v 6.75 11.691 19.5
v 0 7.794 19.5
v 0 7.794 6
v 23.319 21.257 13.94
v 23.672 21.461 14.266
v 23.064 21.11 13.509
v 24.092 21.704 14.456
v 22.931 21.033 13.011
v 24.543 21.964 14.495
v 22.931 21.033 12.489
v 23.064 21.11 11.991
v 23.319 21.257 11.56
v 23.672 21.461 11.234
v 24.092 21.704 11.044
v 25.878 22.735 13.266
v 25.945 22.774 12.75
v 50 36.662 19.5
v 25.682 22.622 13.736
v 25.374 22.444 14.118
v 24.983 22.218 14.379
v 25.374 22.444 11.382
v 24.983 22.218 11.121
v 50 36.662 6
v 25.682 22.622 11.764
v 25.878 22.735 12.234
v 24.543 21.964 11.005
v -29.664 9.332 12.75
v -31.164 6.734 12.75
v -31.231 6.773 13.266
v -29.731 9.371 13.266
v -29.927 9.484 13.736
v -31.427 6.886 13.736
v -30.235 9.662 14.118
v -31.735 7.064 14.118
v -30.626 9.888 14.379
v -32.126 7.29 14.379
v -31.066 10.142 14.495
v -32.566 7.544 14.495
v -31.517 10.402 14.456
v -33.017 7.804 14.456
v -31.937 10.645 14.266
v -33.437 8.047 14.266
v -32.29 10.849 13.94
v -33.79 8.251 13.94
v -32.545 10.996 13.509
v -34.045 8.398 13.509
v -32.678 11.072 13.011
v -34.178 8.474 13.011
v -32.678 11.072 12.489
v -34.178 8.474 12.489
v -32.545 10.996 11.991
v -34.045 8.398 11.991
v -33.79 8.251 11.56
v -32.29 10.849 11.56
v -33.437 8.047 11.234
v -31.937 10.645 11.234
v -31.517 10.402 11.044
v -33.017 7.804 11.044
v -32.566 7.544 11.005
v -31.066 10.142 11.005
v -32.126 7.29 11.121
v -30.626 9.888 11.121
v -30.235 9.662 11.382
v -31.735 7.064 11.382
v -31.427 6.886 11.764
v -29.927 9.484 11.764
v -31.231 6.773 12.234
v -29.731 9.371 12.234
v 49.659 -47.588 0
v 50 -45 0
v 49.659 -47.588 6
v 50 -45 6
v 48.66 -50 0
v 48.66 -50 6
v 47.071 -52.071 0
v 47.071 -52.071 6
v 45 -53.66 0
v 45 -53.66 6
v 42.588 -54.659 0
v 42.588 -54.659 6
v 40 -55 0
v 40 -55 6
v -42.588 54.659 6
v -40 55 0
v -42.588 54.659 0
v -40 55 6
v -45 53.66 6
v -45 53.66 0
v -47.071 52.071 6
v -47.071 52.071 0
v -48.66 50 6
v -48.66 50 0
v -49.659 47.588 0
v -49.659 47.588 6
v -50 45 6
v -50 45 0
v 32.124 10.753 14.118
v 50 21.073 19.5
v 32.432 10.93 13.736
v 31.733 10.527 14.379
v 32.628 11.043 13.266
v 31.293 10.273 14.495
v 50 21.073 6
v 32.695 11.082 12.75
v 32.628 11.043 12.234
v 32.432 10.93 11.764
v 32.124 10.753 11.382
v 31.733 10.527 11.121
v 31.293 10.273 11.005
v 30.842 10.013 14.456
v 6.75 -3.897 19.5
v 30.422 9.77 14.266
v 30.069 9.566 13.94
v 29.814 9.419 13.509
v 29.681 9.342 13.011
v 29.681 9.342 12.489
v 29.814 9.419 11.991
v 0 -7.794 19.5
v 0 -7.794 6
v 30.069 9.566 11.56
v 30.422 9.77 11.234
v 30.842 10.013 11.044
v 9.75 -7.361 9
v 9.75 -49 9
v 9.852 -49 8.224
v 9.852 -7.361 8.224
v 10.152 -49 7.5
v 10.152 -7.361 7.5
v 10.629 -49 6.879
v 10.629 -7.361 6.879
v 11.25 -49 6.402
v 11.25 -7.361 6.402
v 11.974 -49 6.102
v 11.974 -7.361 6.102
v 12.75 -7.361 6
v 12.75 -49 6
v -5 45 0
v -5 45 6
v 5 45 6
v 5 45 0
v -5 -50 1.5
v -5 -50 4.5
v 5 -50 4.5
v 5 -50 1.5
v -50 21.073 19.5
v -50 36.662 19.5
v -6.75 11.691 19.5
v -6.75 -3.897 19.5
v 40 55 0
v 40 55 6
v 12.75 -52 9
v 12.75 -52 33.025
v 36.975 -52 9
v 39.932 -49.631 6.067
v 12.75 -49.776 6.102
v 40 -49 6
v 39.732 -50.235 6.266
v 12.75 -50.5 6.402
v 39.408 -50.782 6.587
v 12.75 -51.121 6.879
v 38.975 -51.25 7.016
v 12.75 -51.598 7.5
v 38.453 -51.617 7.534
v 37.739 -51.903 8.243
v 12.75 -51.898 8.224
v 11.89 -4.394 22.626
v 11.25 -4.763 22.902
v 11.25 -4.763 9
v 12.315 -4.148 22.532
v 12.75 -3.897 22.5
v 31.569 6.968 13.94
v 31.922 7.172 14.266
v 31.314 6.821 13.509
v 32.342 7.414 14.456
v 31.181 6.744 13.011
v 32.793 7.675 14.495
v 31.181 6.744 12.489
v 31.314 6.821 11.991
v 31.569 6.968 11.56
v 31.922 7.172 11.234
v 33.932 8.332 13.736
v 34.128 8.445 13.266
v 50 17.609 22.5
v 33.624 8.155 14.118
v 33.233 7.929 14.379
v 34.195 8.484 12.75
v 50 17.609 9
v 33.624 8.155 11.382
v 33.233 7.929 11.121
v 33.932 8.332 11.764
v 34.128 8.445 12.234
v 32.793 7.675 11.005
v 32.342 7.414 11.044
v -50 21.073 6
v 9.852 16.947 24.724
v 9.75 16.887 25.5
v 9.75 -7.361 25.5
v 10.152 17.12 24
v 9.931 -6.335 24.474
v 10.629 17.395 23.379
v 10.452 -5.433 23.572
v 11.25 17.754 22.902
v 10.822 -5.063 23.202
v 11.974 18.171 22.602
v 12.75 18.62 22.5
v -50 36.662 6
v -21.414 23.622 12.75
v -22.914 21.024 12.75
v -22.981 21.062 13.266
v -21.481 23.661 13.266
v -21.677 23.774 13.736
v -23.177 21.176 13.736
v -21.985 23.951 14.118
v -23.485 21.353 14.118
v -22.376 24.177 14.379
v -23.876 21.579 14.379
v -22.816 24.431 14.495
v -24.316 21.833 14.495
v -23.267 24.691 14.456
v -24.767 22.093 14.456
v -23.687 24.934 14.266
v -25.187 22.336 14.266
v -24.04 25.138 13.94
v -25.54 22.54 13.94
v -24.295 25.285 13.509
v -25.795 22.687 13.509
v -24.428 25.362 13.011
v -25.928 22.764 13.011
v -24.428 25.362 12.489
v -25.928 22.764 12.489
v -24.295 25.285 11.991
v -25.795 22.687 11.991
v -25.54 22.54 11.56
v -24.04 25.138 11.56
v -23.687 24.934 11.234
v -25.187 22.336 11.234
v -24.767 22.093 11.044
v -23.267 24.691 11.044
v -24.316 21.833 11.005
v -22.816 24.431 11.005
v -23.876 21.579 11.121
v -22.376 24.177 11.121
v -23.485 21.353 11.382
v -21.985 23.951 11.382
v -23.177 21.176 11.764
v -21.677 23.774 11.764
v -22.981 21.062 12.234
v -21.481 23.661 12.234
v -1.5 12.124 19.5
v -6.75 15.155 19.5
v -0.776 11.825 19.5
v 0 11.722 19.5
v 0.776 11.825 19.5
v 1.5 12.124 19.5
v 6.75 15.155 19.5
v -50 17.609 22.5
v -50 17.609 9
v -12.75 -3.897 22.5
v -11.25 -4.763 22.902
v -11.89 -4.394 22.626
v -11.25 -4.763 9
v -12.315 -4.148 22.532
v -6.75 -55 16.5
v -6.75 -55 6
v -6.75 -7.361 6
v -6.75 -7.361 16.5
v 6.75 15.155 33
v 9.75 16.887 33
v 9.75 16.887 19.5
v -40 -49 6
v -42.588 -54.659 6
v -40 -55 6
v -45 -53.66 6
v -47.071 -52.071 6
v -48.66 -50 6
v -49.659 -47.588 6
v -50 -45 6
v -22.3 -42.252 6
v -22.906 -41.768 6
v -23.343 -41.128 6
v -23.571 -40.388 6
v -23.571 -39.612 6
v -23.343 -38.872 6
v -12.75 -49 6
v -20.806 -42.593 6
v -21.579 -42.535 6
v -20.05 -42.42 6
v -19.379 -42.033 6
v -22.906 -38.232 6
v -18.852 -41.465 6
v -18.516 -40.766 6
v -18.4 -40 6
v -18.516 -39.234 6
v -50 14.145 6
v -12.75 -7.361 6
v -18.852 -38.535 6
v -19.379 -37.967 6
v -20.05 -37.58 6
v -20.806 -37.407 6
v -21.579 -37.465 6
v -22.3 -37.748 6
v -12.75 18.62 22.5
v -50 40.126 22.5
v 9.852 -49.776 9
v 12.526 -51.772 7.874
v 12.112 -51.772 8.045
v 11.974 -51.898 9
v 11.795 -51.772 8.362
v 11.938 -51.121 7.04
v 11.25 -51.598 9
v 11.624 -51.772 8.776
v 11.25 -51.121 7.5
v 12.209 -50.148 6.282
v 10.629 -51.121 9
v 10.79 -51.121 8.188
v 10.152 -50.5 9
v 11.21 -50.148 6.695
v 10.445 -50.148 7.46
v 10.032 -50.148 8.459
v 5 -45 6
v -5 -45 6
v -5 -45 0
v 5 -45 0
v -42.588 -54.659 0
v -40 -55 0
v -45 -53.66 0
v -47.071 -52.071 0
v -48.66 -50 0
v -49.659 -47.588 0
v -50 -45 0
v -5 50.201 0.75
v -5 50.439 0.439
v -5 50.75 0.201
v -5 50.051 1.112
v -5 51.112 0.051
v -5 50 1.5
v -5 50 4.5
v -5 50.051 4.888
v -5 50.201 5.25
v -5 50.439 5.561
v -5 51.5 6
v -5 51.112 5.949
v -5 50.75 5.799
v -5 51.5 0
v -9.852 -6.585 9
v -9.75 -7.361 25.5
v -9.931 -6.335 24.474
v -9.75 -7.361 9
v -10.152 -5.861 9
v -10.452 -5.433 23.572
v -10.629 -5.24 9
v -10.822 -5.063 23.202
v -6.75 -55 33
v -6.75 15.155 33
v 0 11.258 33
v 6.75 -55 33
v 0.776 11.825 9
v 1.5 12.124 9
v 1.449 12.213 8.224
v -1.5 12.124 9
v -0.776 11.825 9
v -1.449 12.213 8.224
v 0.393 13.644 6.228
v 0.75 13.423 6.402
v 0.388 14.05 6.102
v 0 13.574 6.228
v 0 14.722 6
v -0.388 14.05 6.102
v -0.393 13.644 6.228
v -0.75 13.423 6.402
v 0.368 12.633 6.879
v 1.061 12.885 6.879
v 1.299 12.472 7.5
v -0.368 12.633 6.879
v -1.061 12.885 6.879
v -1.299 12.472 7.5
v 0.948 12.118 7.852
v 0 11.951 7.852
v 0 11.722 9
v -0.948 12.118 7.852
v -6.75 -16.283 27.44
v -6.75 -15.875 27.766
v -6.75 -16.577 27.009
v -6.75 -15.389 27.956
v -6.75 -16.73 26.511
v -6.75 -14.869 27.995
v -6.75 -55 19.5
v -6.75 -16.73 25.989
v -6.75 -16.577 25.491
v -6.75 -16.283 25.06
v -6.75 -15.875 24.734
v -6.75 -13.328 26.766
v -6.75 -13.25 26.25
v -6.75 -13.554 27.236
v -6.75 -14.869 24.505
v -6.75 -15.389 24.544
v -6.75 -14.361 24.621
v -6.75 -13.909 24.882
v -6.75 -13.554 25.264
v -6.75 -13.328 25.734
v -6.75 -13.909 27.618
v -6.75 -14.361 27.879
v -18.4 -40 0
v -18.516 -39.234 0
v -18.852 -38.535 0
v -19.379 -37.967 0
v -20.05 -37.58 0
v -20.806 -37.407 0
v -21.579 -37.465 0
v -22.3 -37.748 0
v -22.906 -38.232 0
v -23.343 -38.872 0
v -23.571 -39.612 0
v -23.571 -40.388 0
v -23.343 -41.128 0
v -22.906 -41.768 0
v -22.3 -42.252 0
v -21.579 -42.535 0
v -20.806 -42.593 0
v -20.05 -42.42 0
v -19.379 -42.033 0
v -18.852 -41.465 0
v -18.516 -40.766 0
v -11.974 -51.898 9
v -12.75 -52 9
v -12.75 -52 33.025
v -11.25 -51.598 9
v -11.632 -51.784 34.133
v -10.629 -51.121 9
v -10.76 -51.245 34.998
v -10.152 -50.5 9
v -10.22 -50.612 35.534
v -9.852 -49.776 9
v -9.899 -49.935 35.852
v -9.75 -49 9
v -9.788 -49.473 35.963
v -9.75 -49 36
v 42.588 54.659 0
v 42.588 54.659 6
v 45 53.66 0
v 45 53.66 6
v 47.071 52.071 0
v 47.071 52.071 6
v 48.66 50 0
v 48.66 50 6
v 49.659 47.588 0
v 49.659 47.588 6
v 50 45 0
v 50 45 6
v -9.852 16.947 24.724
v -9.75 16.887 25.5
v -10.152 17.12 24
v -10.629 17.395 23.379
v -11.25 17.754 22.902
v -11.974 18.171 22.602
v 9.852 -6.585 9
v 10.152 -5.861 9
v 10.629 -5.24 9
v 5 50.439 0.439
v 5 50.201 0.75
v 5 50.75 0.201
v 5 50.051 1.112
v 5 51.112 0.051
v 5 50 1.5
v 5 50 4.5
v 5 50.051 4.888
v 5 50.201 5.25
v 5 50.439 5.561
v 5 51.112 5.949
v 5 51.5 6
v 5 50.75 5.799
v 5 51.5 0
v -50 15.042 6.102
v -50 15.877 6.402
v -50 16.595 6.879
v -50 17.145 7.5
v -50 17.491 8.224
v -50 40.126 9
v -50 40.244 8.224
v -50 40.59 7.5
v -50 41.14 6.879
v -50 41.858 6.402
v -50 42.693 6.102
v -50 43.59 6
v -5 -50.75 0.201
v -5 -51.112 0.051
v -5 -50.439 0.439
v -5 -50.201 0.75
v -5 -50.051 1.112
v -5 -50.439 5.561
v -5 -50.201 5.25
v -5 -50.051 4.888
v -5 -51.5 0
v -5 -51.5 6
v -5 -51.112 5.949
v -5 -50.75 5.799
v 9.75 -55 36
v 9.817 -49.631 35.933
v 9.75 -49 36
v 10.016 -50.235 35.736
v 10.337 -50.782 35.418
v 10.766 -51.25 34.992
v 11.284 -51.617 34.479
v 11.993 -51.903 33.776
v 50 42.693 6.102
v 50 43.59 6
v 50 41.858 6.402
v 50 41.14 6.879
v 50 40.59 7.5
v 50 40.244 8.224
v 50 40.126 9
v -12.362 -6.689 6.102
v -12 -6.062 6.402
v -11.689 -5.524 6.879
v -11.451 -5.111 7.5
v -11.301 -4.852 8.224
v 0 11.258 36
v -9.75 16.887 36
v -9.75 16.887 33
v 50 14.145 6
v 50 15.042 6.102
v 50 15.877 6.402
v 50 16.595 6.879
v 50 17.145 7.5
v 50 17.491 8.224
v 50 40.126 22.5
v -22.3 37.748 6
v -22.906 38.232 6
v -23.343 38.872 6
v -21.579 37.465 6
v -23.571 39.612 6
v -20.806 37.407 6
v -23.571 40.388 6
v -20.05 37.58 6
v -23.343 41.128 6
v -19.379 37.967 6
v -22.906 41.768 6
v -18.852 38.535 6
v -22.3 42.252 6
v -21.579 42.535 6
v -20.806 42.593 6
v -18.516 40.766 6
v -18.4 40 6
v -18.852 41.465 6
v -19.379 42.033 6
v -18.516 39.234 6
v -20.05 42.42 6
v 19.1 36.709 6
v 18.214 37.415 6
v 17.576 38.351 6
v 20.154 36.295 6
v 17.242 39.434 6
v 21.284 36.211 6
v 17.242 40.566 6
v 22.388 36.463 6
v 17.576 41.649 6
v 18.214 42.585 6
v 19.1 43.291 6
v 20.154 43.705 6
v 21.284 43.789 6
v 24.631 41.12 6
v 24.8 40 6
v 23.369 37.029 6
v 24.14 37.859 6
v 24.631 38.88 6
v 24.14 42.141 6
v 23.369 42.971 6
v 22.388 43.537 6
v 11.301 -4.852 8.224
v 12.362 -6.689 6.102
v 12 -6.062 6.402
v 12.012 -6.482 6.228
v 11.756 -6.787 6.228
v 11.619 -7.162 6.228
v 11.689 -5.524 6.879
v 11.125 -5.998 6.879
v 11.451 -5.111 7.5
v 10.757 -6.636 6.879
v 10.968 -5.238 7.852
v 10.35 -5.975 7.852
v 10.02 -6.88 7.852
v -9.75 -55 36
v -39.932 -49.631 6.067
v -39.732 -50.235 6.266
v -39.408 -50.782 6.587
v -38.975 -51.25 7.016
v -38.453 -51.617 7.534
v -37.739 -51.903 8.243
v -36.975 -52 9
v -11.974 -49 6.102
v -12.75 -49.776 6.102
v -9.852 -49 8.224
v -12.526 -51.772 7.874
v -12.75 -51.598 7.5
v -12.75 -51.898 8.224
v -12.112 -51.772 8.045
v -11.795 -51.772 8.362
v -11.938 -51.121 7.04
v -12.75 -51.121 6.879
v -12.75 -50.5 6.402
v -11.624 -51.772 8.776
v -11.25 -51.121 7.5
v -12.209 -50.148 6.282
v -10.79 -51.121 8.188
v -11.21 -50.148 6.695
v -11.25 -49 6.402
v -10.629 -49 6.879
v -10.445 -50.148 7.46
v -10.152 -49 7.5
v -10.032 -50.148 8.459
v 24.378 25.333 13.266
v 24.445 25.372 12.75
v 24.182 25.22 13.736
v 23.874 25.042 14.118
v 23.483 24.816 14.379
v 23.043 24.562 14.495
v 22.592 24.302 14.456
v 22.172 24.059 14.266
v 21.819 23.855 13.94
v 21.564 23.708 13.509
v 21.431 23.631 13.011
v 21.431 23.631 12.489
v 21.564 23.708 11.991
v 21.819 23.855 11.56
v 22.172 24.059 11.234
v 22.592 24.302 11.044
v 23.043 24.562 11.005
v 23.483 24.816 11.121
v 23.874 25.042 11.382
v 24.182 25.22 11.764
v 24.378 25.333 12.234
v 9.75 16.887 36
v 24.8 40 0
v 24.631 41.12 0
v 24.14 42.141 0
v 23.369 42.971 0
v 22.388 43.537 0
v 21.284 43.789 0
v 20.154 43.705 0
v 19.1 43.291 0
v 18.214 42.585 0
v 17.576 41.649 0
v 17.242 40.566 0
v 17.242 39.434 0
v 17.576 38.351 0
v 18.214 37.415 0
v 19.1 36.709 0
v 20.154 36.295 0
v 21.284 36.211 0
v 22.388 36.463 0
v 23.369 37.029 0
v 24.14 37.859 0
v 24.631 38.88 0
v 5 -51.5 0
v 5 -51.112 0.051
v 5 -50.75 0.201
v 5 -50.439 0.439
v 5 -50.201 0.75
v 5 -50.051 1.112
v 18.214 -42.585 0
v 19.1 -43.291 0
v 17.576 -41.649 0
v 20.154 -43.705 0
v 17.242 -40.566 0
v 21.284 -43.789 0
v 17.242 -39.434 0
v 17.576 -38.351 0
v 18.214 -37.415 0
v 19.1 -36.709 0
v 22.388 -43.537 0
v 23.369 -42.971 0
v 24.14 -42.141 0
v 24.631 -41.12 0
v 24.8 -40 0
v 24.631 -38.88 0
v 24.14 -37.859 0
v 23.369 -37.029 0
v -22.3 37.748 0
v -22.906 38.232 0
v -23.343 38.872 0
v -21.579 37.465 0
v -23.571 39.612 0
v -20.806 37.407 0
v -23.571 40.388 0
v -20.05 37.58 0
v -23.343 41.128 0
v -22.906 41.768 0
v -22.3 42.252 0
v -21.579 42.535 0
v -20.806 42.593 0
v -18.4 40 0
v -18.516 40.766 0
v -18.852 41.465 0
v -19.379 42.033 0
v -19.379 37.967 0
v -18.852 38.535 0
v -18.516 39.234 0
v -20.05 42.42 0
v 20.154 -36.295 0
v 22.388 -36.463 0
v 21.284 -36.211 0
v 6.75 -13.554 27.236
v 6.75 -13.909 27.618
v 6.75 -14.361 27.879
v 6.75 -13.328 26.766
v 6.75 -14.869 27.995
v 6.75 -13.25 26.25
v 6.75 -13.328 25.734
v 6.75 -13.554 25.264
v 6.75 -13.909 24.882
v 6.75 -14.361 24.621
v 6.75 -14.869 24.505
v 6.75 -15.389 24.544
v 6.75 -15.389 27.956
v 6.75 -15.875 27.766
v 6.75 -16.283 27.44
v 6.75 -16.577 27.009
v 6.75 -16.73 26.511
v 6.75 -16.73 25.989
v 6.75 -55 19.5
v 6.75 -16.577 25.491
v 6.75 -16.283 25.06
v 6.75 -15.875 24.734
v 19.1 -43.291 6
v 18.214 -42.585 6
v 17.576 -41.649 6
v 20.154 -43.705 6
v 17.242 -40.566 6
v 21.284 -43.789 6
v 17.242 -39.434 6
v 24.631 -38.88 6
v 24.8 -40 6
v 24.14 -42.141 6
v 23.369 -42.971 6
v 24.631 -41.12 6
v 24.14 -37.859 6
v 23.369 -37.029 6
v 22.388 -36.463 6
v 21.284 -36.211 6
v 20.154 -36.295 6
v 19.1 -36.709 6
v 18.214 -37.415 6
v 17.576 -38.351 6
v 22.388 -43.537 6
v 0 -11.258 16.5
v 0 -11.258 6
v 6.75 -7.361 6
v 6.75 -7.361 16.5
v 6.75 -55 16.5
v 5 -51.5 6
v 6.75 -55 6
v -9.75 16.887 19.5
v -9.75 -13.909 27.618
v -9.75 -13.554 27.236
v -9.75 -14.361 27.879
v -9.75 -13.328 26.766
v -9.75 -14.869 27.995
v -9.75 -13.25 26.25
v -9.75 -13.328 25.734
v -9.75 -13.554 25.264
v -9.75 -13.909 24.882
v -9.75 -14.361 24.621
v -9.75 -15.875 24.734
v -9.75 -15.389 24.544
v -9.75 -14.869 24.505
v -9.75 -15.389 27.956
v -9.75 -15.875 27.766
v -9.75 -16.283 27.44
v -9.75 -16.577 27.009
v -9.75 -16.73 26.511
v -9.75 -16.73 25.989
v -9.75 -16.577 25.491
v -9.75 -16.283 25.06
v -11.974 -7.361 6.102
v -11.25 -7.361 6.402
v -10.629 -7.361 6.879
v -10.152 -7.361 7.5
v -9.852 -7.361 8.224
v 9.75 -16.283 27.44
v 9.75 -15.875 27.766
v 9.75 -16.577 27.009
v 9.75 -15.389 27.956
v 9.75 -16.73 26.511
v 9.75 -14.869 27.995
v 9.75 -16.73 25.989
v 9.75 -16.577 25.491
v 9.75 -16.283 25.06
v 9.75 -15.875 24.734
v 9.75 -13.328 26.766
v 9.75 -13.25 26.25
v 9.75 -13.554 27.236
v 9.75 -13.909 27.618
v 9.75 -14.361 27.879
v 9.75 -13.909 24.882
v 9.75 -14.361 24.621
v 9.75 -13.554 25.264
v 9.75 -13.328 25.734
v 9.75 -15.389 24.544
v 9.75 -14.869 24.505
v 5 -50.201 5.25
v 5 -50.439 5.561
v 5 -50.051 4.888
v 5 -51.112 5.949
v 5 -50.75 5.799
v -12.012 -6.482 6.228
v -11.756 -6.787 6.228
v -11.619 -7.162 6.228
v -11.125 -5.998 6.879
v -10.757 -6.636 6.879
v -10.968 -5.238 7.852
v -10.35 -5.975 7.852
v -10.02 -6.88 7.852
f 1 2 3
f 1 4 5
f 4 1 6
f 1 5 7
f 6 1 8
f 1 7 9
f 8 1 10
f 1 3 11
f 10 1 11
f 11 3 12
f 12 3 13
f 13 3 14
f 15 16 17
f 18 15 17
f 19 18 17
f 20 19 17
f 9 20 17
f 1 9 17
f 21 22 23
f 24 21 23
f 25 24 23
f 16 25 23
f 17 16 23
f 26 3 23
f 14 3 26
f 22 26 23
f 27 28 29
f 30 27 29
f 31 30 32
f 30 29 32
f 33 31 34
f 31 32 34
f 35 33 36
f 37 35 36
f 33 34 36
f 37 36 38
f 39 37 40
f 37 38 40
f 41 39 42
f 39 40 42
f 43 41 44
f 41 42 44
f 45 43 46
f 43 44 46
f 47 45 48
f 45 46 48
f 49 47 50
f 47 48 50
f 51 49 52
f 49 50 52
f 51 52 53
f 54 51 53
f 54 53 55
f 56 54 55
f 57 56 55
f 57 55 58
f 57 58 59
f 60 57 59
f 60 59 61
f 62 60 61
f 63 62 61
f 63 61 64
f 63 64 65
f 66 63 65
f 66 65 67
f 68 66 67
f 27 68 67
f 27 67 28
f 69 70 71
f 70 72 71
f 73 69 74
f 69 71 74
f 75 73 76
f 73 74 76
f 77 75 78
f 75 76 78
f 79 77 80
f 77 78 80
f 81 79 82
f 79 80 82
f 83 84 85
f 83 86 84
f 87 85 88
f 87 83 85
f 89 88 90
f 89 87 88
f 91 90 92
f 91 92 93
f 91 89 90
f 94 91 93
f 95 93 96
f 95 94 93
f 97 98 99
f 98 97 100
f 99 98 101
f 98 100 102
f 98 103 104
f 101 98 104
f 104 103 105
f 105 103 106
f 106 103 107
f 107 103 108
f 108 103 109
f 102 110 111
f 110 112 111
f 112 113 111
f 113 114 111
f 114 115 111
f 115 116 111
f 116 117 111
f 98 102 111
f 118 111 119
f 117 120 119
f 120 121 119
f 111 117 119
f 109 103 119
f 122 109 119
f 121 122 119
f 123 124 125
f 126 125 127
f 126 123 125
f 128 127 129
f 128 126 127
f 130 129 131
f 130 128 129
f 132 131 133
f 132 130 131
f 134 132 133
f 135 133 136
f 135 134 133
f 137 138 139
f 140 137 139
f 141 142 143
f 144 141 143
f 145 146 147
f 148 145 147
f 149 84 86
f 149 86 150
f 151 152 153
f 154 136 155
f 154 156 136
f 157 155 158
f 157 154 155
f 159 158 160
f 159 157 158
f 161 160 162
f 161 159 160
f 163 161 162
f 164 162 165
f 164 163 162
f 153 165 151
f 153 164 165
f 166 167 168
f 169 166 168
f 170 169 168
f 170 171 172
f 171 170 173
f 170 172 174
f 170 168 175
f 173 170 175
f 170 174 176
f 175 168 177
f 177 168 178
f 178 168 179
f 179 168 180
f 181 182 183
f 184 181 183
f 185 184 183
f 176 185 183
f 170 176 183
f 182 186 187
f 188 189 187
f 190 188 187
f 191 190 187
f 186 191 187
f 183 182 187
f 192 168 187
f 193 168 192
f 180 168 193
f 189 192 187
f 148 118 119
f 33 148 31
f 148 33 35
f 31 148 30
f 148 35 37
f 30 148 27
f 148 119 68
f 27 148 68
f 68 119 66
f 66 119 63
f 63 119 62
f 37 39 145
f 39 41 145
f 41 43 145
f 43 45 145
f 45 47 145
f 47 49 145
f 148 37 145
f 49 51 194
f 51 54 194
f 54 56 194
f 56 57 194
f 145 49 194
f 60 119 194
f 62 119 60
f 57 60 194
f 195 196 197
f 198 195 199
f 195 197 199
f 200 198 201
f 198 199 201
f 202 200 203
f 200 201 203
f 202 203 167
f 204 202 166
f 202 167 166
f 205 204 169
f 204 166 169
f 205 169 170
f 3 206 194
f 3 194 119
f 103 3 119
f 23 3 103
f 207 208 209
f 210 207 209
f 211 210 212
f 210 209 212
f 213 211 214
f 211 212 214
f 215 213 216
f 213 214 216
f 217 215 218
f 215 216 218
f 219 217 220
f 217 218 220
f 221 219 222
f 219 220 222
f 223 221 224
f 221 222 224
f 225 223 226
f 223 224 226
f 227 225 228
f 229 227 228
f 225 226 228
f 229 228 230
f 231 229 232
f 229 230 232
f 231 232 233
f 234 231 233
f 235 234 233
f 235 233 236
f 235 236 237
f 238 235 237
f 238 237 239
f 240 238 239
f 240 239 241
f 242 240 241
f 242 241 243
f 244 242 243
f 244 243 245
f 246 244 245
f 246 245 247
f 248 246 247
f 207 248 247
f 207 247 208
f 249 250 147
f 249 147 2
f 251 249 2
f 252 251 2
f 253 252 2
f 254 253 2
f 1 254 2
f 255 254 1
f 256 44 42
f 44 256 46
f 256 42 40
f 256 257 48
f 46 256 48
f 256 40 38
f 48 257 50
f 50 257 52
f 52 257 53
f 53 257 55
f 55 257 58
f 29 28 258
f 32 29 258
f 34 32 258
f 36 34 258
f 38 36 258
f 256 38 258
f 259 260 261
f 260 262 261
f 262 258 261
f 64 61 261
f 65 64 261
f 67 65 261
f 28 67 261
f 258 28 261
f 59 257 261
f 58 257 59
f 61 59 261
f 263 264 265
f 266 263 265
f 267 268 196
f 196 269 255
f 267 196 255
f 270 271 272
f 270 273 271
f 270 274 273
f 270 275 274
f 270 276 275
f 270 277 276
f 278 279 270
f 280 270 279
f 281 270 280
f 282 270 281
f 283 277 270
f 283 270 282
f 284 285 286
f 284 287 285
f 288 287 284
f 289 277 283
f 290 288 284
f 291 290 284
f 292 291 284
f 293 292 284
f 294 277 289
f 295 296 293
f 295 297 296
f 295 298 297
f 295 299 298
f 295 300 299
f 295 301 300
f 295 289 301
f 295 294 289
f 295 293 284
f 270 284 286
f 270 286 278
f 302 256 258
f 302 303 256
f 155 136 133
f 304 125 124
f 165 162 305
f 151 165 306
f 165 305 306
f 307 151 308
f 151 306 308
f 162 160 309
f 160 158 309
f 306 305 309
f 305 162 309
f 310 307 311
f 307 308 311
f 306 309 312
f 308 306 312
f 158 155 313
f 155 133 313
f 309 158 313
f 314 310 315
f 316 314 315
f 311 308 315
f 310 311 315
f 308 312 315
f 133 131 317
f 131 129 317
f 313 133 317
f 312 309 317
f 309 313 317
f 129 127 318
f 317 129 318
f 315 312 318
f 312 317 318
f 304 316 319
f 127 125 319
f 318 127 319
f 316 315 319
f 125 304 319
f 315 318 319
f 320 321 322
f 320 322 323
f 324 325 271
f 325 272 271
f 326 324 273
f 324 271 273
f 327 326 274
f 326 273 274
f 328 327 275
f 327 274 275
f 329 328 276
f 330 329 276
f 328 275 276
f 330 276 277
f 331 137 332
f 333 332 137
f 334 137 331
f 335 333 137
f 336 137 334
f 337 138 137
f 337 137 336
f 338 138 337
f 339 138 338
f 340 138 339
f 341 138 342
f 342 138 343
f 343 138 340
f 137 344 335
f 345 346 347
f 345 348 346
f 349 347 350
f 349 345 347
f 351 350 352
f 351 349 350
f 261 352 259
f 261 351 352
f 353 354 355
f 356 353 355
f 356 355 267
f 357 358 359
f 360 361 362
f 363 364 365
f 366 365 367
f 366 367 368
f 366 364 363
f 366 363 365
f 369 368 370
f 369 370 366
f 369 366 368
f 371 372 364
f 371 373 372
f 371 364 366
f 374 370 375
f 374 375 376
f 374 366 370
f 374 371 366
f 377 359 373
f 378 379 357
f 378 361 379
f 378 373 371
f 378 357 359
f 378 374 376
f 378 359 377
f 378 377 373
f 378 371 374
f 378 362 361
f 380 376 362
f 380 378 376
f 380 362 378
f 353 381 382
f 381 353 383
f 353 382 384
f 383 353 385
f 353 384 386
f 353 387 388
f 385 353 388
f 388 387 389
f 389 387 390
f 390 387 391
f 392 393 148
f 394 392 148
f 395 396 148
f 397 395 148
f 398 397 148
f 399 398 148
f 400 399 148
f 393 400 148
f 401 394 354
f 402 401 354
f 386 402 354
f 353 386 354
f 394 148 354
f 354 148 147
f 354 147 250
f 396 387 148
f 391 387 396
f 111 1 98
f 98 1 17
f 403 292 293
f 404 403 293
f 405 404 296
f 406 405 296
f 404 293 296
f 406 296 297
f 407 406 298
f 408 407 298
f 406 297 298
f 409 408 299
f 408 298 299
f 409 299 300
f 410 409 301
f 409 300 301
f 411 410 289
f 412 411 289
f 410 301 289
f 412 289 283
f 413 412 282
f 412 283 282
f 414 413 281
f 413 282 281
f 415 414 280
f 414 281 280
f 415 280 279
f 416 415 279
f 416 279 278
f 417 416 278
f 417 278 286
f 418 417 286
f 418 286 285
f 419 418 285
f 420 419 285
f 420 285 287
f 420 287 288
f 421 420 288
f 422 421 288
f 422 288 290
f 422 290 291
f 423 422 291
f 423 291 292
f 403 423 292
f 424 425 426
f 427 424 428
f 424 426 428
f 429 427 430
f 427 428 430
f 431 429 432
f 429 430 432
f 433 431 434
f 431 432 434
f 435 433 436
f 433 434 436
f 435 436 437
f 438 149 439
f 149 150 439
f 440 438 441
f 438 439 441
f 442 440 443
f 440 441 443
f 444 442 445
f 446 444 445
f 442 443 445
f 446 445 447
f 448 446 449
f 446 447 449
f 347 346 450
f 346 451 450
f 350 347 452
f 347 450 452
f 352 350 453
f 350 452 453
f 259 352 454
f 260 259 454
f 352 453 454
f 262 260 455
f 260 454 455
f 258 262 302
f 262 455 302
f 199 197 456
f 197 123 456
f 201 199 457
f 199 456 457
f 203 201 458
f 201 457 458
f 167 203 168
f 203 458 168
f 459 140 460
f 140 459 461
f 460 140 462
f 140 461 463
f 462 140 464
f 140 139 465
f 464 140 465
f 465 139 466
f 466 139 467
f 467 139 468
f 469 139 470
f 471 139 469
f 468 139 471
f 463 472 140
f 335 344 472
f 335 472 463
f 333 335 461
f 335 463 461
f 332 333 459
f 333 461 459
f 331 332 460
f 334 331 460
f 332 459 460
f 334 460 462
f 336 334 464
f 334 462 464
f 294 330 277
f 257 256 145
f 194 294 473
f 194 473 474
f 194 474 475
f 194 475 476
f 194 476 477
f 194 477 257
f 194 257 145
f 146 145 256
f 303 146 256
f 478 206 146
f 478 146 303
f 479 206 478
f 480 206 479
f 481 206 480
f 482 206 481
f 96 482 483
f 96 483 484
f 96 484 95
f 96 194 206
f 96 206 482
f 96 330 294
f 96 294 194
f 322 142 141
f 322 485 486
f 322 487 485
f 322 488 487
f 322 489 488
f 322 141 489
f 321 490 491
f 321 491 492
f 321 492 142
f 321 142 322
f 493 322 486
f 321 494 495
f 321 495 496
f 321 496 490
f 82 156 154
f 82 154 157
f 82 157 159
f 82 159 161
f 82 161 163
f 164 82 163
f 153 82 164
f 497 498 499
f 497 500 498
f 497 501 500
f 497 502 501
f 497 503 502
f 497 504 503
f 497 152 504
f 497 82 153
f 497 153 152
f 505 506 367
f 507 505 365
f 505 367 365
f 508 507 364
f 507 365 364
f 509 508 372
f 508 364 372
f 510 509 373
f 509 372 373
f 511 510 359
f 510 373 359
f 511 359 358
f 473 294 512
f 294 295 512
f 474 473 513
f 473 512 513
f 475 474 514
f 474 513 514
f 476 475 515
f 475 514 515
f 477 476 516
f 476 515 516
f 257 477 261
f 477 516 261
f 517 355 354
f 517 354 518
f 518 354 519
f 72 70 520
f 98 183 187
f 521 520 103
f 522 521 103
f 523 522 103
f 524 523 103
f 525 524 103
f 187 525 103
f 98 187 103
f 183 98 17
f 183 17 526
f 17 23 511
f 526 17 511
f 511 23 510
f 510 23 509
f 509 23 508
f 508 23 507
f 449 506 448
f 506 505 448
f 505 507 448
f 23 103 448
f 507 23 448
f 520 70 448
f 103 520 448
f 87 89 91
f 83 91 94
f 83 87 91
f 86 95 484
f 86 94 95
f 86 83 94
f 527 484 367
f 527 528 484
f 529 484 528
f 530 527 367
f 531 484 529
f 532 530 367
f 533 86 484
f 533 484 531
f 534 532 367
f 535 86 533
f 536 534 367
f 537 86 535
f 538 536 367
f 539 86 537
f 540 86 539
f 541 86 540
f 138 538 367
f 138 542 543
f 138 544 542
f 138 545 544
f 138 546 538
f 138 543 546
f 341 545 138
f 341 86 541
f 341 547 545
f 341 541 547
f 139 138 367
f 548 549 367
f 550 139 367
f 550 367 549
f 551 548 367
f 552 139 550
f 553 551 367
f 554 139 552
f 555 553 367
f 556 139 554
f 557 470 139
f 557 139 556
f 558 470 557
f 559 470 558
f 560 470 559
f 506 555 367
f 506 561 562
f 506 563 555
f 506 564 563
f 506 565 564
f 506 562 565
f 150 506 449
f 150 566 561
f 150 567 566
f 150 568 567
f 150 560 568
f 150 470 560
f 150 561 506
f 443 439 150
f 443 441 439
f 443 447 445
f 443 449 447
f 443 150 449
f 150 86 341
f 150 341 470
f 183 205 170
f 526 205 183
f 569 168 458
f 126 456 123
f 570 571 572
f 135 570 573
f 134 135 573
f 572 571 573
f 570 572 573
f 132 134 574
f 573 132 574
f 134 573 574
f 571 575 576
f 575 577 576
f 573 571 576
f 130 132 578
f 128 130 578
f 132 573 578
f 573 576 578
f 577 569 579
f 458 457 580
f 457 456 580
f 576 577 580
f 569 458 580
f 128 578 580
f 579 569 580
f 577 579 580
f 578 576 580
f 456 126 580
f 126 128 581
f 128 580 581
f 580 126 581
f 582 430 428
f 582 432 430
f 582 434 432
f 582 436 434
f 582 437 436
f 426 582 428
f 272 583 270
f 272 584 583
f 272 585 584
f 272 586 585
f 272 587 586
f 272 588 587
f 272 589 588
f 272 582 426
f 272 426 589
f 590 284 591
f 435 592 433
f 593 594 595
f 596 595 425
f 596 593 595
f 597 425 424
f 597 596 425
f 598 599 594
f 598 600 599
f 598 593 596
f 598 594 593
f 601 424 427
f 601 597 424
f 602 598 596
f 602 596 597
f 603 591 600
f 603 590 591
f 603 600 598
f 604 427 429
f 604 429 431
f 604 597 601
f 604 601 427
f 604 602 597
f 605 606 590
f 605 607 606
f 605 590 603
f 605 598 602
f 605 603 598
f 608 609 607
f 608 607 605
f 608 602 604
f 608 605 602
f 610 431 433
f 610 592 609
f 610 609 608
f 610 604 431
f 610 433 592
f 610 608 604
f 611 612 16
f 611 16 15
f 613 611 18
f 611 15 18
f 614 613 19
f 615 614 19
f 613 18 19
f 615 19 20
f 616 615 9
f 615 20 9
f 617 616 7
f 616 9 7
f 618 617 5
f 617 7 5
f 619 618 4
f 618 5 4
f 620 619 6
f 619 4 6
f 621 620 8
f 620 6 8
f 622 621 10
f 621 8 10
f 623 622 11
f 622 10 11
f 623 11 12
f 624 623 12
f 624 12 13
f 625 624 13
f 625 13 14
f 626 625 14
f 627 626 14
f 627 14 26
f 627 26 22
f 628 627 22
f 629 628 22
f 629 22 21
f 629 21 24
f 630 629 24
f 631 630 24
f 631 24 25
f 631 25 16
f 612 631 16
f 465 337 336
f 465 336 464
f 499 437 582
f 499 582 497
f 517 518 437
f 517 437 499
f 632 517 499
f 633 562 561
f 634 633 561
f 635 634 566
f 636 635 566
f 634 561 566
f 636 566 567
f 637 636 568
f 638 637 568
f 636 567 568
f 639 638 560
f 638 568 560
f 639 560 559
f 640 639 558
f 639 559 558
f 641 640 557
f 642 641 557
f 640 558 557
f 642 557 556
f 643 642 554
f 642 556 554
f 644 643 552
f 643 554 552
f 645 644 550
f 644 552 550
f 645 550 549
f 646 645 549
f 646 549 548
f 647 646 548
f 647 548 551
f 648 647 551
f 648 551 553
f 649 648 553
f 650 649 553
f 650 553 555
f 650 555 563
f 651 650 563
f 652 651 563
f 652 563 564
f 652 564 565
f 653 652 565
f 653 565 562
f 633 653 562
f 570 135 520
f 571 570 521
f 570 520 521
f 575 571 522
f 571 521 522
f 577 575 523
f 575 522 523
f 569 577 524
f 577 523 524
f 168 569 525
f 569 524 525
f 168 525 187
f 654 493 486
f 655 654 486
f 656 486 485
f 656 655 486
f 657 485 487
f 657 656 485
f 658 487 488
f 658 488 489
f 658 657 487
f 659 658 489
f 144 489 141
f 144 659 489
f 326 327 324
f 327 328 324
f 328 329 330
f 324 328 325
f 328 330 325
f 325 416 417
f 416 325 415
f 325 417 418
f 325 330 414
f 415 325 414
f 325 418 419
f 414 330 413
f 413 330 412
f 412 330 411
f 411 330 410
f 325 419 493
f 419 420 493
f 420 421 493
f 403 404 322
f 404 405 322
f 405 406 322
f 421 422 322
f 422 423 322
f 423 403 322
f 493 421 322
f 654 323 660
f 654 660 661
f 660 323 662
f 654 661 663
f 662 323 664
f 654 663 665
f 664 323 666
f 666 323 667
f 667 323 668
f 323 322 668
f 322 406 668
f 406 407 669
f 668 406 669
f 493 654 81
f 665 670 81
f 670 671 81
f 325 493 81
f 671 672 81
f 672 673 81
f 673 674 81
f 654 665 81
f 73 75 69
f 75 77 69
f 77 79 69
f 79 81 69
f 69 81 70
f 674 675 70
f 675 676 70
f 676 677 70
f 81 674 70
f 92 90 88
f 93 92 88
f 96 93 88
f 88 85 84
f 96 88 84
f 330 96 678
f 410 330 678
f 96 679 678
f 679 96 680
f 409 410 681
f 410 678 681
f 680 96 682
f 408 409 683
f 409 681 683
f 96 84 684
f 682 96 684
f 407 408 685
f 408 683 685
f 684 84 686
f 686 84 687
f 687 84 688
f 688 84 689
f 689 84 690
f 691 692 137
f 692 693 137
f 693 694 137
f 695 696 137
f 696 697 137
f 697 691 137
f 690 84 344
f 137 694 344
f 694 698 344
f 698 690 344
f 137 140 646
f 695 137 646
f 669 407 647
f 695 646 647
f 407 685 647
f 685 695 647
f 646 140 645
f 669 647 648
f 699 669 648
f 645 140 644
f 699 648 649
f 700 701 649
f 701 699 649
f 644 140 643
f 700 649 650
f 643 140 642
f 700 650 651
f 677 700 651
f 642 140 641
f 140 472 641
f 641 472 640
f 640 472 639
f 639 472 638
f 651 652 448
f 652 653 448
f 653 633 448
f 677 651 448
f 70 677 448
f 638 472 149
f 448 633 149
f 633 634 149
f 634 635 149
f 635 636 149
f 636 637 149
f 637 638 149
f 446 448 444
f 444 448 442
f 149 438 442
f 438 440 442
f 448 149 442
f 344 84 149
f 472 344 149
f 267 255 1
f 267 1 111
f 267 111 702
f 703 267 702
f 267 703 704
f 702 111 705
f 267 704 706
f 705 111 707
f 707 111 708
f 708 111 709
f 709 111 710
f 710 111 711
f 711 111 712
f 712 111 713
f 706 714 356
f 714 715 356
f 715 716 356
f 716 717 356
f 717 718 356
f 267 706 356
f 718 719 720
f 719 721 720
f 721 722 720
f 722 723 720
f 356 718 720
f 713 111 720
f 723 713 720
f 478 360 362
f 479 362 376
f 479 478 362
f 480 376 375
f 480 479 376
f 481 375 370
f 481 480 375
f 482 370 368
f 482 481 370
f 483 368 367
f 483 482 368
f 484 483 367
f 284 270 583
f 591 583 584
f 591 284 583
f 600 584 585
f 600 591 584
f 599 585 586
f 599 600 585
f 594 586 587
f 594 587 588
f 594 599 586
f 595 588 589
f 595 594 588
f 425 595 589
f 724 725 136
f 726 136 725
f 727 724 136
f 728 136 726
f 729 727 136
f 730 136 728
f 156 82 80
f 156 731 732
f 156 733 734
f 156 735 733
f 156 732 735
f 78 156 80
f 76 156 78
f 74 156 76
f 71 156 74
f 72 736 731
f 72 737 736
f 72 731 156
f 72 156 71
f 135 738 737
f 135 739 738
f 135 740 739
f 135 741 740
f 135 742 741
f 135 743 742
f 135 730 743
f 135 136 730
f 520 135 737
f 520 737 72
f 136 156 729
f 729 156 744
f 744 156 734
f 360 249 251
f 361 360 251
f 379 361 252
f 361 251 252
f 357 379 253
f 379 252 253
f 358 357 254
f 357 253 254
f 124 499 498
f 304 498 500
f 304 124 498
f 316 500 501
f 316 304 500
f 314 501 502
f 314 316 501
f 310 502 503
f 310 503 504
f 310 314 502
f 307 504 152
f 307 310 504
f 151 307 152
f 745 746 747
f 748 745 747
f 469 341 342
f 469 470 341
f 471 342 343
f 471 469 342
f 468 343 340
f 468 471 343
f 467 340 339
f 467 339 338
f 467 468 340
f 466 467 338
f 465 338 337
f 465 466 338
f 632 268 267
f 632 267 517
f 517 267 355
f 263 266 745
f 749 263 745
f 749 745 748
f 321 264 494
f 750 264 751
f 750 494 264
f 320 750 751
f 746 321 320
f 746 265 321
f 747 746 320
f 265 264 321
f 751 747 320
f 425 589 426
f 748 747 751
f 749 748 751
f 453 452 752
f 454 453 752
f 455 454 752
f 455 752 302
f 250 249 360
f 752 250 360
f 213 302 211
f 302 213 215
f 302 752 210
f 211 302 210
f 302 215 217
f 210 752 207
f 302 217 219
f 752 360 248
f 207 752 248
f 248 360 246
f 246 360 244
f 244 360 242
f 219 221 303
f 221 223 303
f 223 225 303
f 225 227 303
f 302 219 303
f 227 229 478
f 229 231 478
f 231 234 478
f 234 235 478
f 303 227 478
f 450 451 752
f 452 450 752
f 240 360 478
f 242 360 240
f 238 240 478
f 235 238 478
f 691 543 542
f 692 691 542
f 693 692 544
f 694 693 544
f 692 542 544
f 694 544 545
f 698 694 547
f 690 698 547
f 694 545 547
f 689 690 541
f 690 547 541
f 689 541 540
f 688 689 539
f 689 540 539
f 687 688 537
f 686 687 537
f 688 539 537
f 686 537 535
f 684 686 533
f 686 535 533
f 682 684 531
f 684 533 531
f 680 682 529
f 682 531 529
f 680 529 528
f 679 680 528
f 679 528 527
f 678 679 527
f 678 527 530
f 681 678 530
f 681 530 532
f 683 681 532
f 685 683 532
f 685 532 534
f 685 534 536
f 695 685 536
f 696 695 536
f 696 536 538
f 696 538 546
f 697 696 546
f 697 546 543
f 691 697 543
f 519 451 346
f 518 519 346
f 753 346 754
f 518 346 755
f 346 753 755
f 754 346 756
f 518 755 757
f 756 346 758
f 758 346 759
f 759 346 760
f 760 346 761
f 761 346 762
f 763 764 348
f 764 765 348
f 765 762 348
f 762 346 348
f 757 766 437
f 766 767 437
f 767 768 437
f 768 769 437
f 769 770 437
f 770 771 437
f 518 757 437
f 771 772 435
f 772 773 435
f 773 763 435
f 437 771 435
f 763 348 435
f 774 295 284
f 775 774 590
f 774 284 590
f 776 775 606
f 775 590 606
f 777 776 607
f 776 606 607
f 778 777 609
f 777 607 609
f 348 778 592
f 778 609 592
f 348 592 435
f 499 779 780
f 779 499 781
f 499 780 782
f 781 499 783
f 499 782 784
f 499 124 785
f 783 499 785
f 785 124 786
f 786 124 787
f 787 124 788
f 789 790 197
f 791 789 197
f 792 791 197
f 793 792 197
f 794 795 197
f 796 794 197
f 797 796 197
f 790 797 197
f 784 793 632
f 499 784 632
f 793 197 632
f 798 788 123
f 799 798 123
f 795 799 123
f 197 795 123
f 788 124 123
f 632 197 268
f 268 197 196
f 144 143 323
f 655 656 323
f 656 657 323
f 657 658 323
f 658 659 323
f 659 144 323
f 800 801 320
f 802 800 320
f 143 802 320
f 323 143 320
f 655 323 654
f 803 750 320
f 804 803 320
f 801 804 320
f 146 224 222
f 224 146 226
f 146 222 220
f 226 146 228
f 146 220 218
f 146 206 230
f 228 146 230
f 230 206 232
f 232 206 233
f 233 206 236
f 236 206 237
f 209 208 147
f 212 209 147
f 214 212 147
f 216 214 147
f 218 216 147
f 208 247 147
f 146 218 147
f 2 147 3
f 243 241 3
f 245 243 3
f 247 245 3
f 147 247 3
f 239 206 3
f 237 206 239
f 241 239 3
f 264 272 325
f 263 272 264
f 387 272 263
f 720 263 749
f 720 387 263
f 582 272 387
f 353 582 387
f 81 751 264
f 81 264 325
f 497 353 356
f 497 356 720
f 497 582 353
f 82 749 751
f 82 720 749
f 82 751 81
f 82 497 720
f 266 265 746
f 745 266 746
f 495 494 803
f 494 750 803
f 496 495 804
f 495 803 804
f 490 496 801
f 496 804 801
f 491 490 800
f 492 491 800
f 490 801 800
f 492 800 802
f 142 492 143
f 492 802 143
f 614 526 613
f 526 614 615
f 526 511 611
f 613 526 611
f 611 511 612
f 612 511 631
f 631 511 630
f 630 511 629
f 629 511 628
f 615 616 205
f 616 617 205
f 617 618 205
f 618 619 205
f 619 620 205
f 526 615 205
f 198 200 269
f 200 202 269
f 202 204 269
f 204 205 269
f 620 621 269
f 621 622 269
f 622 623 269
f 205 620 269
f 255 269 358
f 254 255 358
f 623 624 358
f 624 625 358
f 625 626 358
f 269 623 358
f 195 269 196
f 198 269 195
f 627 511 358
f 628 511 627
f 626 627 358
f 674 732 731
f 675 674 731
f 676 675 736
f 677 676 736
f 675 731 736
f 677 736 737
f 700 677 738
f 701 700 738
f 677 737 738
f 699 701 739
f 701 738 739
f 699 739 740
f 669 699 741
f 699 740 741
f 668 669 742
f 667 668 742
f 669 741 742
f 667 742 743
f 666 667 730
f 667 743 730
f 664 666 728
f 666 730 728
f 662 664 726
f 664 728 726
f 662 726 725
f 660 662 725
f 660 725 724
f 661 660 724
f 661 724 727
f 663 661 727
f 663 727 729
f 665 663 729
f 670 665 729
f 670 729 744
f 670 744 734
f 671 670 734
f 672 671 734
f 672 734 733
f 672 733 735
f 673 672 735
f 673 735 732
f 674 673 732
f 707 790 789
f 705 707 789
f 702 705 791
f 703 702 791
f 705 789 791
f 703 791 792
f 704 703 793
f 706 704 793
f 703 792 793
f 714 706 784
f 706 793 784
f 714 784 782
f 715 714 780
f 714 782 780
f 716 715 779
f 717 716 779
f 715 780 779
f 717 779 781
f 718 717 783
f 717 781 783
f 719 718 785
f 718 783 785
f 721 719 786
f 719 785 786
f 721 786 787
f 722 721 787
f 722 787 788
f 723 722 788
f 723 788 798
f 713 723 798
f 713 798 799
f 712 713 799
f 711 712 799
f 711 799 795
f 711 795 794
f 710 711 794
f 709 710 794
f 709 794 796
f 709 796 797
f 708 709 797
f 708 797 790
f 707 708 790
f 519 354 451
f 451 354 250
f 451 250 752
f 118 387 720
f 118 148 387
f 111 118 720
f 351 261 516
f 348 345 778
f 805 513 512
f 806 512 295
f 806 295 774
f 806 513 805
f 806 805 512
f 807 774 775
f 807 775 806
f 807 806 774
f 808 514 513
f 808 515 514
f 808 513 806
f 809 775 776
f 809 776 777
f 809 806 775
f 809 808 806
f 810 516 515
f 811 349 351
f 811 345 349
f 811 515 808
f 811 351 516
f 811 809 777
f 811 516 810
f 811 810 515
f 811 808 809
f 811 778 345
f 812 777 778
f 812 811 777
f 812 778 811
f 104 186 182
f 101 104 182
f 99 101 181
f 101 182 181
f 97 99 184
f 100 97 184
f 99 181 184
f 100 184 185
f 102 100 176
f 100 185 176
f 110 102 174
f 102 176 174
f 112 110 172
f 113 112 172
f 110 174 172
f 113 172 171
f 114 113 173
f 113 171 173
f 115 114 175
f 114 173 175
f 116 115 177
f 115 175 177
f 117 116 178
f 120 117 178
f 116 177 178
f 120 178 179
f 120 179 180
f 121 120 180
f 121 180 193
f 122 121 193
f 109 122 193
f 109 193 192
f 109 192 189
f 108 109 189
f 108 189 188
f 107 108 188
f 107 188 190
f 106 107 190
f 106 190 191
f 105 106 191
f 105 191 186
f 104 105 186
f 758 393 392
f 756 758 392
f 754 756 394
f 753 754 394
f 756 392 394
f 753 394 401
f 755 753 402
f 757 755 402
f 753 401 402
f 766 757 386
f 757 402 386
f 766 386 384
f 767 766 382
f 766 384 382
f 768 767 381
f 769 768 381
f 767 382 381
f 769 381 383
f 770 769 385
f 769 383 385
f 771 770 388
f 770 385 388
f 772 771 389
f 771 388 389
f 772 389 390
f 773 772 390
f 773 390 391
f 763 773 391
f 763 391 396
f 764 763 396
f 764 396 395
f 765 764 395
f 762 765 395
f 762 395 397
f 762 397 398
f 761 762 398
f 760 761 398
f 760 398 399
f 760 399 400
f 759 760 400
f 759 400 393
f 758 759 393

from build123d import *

# Parameters (mm, degrees)
F0_W      = 100
F0_H      = 110
F1_DEPTH  = 6
F2_W      = 10
F2_H      = 5
F3_DEPTH  = 6.001
F5_R      = 3.8
F5_R_2    = 2.6
F6_DEPTH  = 6.001
F7_DEPTH  = 13.5
F10_DEPTH = 13.5
F12_DEPTH = 3
F14_DEPTH = 3
F16_DEPTH = 3
F17_R     = 1.75
F18_DEPTH = 82.3823972081
F19_R     = 1.75
F20_DEPTH = 82.3823972081
F21_R     = 1.5
F22_R     = 10
F24_DEPTH = 3
F25_R     = 3
F26_R     = 1.75
F27_DEPTH = 59.751


with BuildPart() as f1:
    # F0 (on Top) → F1 (new body)
    with BuildSketch(Plane.XY):
        Rectangle(F0_W, F0_H)
    extrude(amount=F1_DEPTH)

    # F2 (on face) → F3 (cut, through all)
    with BuildSketch(Plane.XY.offset(6)):
        with Locations((0, 47.5)):
            Rectangle(F2_W, F2_H)
        with Locations((0, -47.5)):
            Rectangle(F2_W, F2_H)
    extrude(amount=-F3_DEPTH, mode=Mode.SUBTRACT)

    # F5 (on face) → F6 (cut, through all)
    with BuildSketch(Plane.XY.offset(6)):
        with Locations((21, -40)):
            Circle(F5_R)
        with Locations((21, 40)):
            Circle(F5_R)
        with Locations((-21, 40)):
            Circle(F5_R_2)
        with Locations((-21, -40)):
            Circle(F5_R_2)
    extrude(amount=-F6_DEPTH, mode=Mode.SUBTRACT)

    # F4 (on face) → F7 (join)
    with BuildSketch(Plane.XY.offset(6)):
        Polygon((50, 21.0732848254), (0, -7.7942286341), (-50, 21.0732848254), (-50, 17.6091832103), (-9.75, -5.6291651246), (-9.75, -55), (-6.75, -55), (-6.75, -7.3612159322), (0, -11.2583302492), (6.75, -7.3612159322), (6.75, -55), (9.75, -55), (9.75, -5.6291651246), (50, 17.6091832103), align=None)
        Polygon((-50, 36.6617420935), (0, 7.7942286341), (50, 36.6617420935), (50, 40.1258437087), (0, 11.2583302492), (-50, 40.1258437087), align=None)
    extrude(amount=F7_DEPTH)

    # F9 (on face) → F10 (join)
    with BuildSketch(Plane.XY.offset(19.5)):
        Polygon((-9.75, 16.8874953738), (-9.75, -55), (-6.75, -55), (-6.75, 15.1554445662), align=None)
        Polygon((9.75, 16.8874953738), (6.75, 15.1554445662), (6.75, -55), (9.75, -55), align=None)
    extrude(amount=F10_DEPTH)

    # F11 (on face) → F12 (join)
    with BuildSketch(Plane.XY.offset(19.5)):
        Polygon((9.75, 16.8874953738), (9.75, -5.6291651246), (50, 17.6091832103), (50, 40.1258437087), align=None)
        Polygon((-50, 40.1258437087), (-50, 17.6091832103), (-9.75, -5.6291651246), (-9.75, 16.8874953738), align=None)
    extrude(amount=F12_DEPTH)

    # F13 (on offset) → F14 (join)
    with BuildSketch(Plane.XY.offset(19.5)):
        Polygon((-6.75, -7.3612159322), (-6.75, -55), (6.75, -55), (6.75, -7.3612159322), (0, -11.2583302492), align=None)
    extrude(amount=-F14_DEPTH)

    # F15 (on face) → F16 (join)
    with BuildSketch(Plane.XY.offset(33)):
        Polygon((0, 11.2583302492), (-9.75, 16.8874953738), (-9.75, -55), (9.75, -55), (9.75, 16.8874953738), align=None)
    extrude(amount=F16_DEPTH)

    # F17 (on face) → F18 (cut, through all)
    with BuildSketch(Plane(origin=(4.875, -8.4437476869, 0), x_dir=(0.8660254038, 0.5, 0), z_dir=(0.5, -0.8660254038, 0))):
        with Locations((32.1058617944, 12.75)):
            Circle(F17_R)
    extrude(amount=-F18_DEPTH, mode=Mode.SUBTRACT)

    # F19 (on face) → F20 (cut, through all)
    with BuildSketch(Plane(origin=(-4.875, -8.4437476869, 0), x_dir=(0.8660254038, -0.5, 0), z_dir=(-0.5, -0.8660254038, 0))):
        with Locations((-32.1058617944, 12.75)):
            Circle(F19_R)
    extrude(amount=-F20_DEPTH, mode=Mode.SUBTRACT)

    # F21
    f21_edges = [f1.edges().sort_by_distance(p)[0] for p in [
        (0, 50, 6),
        (0, 50, 0),
        (0, -50, 0),
        (0, -50, 6),
    ]]
    fillet(f21_edges, radius=F21_R)

    # F22
    f22_edges = [f1.edges().sort_by_distance(p)[0] for p in [
        (-50, -55, 3),
        (50, -55, 3),
        (50, 55, 3),
        (-50, 55, 3),
    ]]
    fillet(f22_edges, radius=F22_R)

    # F23 (on face) → F24 (join)
    with BuildSketch(Plane.XZ.offset(55)):
        Polygon((-9.75, 6), (-9.75, 36), (-40, 6), align=None)
        Polygon((9.75, 6), (40, 6), (9.75, 36), align=None)
    extrude(amount=-F24_DEPTH)

    # F25
    f25_edges = [f1.edges().sort_by_distance(p)[0] for p in [
        (-9.75, 5.629165, 22.5),
        (-9.75, -28.814583, 6),
        (-9.75, -5.629165, 14.25),
        (-29.875, 5.990009, 6),
        (9.75, -28.814583, 6),
        (9.75, -5.629165, 14.25),
        (9.75, 5.629165, 22.5),
        (29.875, 5.990009, 6),
        (24.875, -52, 6),
        (-24.875, -52, 6),
        (25, 25.692087, 6),
        (-25, 25.692087, 6),
        (0, 11.25833, 12.75),
        (9.75, -52, 21),
        (-9.75, -52, 21),
    ]]
    fillet(f25_edges, radius=F25_R)

    # F26 (on face) → F27 (cut, through all)
    with BuildSketch(Plane.YZ.offset(9.75)):
        with Locations((-15, 26.25)):
            Circle(F26_R)
    extrude(amount=-F27_DEPTH, mode=Mode.SUBTRACT)


solid = f1.part
